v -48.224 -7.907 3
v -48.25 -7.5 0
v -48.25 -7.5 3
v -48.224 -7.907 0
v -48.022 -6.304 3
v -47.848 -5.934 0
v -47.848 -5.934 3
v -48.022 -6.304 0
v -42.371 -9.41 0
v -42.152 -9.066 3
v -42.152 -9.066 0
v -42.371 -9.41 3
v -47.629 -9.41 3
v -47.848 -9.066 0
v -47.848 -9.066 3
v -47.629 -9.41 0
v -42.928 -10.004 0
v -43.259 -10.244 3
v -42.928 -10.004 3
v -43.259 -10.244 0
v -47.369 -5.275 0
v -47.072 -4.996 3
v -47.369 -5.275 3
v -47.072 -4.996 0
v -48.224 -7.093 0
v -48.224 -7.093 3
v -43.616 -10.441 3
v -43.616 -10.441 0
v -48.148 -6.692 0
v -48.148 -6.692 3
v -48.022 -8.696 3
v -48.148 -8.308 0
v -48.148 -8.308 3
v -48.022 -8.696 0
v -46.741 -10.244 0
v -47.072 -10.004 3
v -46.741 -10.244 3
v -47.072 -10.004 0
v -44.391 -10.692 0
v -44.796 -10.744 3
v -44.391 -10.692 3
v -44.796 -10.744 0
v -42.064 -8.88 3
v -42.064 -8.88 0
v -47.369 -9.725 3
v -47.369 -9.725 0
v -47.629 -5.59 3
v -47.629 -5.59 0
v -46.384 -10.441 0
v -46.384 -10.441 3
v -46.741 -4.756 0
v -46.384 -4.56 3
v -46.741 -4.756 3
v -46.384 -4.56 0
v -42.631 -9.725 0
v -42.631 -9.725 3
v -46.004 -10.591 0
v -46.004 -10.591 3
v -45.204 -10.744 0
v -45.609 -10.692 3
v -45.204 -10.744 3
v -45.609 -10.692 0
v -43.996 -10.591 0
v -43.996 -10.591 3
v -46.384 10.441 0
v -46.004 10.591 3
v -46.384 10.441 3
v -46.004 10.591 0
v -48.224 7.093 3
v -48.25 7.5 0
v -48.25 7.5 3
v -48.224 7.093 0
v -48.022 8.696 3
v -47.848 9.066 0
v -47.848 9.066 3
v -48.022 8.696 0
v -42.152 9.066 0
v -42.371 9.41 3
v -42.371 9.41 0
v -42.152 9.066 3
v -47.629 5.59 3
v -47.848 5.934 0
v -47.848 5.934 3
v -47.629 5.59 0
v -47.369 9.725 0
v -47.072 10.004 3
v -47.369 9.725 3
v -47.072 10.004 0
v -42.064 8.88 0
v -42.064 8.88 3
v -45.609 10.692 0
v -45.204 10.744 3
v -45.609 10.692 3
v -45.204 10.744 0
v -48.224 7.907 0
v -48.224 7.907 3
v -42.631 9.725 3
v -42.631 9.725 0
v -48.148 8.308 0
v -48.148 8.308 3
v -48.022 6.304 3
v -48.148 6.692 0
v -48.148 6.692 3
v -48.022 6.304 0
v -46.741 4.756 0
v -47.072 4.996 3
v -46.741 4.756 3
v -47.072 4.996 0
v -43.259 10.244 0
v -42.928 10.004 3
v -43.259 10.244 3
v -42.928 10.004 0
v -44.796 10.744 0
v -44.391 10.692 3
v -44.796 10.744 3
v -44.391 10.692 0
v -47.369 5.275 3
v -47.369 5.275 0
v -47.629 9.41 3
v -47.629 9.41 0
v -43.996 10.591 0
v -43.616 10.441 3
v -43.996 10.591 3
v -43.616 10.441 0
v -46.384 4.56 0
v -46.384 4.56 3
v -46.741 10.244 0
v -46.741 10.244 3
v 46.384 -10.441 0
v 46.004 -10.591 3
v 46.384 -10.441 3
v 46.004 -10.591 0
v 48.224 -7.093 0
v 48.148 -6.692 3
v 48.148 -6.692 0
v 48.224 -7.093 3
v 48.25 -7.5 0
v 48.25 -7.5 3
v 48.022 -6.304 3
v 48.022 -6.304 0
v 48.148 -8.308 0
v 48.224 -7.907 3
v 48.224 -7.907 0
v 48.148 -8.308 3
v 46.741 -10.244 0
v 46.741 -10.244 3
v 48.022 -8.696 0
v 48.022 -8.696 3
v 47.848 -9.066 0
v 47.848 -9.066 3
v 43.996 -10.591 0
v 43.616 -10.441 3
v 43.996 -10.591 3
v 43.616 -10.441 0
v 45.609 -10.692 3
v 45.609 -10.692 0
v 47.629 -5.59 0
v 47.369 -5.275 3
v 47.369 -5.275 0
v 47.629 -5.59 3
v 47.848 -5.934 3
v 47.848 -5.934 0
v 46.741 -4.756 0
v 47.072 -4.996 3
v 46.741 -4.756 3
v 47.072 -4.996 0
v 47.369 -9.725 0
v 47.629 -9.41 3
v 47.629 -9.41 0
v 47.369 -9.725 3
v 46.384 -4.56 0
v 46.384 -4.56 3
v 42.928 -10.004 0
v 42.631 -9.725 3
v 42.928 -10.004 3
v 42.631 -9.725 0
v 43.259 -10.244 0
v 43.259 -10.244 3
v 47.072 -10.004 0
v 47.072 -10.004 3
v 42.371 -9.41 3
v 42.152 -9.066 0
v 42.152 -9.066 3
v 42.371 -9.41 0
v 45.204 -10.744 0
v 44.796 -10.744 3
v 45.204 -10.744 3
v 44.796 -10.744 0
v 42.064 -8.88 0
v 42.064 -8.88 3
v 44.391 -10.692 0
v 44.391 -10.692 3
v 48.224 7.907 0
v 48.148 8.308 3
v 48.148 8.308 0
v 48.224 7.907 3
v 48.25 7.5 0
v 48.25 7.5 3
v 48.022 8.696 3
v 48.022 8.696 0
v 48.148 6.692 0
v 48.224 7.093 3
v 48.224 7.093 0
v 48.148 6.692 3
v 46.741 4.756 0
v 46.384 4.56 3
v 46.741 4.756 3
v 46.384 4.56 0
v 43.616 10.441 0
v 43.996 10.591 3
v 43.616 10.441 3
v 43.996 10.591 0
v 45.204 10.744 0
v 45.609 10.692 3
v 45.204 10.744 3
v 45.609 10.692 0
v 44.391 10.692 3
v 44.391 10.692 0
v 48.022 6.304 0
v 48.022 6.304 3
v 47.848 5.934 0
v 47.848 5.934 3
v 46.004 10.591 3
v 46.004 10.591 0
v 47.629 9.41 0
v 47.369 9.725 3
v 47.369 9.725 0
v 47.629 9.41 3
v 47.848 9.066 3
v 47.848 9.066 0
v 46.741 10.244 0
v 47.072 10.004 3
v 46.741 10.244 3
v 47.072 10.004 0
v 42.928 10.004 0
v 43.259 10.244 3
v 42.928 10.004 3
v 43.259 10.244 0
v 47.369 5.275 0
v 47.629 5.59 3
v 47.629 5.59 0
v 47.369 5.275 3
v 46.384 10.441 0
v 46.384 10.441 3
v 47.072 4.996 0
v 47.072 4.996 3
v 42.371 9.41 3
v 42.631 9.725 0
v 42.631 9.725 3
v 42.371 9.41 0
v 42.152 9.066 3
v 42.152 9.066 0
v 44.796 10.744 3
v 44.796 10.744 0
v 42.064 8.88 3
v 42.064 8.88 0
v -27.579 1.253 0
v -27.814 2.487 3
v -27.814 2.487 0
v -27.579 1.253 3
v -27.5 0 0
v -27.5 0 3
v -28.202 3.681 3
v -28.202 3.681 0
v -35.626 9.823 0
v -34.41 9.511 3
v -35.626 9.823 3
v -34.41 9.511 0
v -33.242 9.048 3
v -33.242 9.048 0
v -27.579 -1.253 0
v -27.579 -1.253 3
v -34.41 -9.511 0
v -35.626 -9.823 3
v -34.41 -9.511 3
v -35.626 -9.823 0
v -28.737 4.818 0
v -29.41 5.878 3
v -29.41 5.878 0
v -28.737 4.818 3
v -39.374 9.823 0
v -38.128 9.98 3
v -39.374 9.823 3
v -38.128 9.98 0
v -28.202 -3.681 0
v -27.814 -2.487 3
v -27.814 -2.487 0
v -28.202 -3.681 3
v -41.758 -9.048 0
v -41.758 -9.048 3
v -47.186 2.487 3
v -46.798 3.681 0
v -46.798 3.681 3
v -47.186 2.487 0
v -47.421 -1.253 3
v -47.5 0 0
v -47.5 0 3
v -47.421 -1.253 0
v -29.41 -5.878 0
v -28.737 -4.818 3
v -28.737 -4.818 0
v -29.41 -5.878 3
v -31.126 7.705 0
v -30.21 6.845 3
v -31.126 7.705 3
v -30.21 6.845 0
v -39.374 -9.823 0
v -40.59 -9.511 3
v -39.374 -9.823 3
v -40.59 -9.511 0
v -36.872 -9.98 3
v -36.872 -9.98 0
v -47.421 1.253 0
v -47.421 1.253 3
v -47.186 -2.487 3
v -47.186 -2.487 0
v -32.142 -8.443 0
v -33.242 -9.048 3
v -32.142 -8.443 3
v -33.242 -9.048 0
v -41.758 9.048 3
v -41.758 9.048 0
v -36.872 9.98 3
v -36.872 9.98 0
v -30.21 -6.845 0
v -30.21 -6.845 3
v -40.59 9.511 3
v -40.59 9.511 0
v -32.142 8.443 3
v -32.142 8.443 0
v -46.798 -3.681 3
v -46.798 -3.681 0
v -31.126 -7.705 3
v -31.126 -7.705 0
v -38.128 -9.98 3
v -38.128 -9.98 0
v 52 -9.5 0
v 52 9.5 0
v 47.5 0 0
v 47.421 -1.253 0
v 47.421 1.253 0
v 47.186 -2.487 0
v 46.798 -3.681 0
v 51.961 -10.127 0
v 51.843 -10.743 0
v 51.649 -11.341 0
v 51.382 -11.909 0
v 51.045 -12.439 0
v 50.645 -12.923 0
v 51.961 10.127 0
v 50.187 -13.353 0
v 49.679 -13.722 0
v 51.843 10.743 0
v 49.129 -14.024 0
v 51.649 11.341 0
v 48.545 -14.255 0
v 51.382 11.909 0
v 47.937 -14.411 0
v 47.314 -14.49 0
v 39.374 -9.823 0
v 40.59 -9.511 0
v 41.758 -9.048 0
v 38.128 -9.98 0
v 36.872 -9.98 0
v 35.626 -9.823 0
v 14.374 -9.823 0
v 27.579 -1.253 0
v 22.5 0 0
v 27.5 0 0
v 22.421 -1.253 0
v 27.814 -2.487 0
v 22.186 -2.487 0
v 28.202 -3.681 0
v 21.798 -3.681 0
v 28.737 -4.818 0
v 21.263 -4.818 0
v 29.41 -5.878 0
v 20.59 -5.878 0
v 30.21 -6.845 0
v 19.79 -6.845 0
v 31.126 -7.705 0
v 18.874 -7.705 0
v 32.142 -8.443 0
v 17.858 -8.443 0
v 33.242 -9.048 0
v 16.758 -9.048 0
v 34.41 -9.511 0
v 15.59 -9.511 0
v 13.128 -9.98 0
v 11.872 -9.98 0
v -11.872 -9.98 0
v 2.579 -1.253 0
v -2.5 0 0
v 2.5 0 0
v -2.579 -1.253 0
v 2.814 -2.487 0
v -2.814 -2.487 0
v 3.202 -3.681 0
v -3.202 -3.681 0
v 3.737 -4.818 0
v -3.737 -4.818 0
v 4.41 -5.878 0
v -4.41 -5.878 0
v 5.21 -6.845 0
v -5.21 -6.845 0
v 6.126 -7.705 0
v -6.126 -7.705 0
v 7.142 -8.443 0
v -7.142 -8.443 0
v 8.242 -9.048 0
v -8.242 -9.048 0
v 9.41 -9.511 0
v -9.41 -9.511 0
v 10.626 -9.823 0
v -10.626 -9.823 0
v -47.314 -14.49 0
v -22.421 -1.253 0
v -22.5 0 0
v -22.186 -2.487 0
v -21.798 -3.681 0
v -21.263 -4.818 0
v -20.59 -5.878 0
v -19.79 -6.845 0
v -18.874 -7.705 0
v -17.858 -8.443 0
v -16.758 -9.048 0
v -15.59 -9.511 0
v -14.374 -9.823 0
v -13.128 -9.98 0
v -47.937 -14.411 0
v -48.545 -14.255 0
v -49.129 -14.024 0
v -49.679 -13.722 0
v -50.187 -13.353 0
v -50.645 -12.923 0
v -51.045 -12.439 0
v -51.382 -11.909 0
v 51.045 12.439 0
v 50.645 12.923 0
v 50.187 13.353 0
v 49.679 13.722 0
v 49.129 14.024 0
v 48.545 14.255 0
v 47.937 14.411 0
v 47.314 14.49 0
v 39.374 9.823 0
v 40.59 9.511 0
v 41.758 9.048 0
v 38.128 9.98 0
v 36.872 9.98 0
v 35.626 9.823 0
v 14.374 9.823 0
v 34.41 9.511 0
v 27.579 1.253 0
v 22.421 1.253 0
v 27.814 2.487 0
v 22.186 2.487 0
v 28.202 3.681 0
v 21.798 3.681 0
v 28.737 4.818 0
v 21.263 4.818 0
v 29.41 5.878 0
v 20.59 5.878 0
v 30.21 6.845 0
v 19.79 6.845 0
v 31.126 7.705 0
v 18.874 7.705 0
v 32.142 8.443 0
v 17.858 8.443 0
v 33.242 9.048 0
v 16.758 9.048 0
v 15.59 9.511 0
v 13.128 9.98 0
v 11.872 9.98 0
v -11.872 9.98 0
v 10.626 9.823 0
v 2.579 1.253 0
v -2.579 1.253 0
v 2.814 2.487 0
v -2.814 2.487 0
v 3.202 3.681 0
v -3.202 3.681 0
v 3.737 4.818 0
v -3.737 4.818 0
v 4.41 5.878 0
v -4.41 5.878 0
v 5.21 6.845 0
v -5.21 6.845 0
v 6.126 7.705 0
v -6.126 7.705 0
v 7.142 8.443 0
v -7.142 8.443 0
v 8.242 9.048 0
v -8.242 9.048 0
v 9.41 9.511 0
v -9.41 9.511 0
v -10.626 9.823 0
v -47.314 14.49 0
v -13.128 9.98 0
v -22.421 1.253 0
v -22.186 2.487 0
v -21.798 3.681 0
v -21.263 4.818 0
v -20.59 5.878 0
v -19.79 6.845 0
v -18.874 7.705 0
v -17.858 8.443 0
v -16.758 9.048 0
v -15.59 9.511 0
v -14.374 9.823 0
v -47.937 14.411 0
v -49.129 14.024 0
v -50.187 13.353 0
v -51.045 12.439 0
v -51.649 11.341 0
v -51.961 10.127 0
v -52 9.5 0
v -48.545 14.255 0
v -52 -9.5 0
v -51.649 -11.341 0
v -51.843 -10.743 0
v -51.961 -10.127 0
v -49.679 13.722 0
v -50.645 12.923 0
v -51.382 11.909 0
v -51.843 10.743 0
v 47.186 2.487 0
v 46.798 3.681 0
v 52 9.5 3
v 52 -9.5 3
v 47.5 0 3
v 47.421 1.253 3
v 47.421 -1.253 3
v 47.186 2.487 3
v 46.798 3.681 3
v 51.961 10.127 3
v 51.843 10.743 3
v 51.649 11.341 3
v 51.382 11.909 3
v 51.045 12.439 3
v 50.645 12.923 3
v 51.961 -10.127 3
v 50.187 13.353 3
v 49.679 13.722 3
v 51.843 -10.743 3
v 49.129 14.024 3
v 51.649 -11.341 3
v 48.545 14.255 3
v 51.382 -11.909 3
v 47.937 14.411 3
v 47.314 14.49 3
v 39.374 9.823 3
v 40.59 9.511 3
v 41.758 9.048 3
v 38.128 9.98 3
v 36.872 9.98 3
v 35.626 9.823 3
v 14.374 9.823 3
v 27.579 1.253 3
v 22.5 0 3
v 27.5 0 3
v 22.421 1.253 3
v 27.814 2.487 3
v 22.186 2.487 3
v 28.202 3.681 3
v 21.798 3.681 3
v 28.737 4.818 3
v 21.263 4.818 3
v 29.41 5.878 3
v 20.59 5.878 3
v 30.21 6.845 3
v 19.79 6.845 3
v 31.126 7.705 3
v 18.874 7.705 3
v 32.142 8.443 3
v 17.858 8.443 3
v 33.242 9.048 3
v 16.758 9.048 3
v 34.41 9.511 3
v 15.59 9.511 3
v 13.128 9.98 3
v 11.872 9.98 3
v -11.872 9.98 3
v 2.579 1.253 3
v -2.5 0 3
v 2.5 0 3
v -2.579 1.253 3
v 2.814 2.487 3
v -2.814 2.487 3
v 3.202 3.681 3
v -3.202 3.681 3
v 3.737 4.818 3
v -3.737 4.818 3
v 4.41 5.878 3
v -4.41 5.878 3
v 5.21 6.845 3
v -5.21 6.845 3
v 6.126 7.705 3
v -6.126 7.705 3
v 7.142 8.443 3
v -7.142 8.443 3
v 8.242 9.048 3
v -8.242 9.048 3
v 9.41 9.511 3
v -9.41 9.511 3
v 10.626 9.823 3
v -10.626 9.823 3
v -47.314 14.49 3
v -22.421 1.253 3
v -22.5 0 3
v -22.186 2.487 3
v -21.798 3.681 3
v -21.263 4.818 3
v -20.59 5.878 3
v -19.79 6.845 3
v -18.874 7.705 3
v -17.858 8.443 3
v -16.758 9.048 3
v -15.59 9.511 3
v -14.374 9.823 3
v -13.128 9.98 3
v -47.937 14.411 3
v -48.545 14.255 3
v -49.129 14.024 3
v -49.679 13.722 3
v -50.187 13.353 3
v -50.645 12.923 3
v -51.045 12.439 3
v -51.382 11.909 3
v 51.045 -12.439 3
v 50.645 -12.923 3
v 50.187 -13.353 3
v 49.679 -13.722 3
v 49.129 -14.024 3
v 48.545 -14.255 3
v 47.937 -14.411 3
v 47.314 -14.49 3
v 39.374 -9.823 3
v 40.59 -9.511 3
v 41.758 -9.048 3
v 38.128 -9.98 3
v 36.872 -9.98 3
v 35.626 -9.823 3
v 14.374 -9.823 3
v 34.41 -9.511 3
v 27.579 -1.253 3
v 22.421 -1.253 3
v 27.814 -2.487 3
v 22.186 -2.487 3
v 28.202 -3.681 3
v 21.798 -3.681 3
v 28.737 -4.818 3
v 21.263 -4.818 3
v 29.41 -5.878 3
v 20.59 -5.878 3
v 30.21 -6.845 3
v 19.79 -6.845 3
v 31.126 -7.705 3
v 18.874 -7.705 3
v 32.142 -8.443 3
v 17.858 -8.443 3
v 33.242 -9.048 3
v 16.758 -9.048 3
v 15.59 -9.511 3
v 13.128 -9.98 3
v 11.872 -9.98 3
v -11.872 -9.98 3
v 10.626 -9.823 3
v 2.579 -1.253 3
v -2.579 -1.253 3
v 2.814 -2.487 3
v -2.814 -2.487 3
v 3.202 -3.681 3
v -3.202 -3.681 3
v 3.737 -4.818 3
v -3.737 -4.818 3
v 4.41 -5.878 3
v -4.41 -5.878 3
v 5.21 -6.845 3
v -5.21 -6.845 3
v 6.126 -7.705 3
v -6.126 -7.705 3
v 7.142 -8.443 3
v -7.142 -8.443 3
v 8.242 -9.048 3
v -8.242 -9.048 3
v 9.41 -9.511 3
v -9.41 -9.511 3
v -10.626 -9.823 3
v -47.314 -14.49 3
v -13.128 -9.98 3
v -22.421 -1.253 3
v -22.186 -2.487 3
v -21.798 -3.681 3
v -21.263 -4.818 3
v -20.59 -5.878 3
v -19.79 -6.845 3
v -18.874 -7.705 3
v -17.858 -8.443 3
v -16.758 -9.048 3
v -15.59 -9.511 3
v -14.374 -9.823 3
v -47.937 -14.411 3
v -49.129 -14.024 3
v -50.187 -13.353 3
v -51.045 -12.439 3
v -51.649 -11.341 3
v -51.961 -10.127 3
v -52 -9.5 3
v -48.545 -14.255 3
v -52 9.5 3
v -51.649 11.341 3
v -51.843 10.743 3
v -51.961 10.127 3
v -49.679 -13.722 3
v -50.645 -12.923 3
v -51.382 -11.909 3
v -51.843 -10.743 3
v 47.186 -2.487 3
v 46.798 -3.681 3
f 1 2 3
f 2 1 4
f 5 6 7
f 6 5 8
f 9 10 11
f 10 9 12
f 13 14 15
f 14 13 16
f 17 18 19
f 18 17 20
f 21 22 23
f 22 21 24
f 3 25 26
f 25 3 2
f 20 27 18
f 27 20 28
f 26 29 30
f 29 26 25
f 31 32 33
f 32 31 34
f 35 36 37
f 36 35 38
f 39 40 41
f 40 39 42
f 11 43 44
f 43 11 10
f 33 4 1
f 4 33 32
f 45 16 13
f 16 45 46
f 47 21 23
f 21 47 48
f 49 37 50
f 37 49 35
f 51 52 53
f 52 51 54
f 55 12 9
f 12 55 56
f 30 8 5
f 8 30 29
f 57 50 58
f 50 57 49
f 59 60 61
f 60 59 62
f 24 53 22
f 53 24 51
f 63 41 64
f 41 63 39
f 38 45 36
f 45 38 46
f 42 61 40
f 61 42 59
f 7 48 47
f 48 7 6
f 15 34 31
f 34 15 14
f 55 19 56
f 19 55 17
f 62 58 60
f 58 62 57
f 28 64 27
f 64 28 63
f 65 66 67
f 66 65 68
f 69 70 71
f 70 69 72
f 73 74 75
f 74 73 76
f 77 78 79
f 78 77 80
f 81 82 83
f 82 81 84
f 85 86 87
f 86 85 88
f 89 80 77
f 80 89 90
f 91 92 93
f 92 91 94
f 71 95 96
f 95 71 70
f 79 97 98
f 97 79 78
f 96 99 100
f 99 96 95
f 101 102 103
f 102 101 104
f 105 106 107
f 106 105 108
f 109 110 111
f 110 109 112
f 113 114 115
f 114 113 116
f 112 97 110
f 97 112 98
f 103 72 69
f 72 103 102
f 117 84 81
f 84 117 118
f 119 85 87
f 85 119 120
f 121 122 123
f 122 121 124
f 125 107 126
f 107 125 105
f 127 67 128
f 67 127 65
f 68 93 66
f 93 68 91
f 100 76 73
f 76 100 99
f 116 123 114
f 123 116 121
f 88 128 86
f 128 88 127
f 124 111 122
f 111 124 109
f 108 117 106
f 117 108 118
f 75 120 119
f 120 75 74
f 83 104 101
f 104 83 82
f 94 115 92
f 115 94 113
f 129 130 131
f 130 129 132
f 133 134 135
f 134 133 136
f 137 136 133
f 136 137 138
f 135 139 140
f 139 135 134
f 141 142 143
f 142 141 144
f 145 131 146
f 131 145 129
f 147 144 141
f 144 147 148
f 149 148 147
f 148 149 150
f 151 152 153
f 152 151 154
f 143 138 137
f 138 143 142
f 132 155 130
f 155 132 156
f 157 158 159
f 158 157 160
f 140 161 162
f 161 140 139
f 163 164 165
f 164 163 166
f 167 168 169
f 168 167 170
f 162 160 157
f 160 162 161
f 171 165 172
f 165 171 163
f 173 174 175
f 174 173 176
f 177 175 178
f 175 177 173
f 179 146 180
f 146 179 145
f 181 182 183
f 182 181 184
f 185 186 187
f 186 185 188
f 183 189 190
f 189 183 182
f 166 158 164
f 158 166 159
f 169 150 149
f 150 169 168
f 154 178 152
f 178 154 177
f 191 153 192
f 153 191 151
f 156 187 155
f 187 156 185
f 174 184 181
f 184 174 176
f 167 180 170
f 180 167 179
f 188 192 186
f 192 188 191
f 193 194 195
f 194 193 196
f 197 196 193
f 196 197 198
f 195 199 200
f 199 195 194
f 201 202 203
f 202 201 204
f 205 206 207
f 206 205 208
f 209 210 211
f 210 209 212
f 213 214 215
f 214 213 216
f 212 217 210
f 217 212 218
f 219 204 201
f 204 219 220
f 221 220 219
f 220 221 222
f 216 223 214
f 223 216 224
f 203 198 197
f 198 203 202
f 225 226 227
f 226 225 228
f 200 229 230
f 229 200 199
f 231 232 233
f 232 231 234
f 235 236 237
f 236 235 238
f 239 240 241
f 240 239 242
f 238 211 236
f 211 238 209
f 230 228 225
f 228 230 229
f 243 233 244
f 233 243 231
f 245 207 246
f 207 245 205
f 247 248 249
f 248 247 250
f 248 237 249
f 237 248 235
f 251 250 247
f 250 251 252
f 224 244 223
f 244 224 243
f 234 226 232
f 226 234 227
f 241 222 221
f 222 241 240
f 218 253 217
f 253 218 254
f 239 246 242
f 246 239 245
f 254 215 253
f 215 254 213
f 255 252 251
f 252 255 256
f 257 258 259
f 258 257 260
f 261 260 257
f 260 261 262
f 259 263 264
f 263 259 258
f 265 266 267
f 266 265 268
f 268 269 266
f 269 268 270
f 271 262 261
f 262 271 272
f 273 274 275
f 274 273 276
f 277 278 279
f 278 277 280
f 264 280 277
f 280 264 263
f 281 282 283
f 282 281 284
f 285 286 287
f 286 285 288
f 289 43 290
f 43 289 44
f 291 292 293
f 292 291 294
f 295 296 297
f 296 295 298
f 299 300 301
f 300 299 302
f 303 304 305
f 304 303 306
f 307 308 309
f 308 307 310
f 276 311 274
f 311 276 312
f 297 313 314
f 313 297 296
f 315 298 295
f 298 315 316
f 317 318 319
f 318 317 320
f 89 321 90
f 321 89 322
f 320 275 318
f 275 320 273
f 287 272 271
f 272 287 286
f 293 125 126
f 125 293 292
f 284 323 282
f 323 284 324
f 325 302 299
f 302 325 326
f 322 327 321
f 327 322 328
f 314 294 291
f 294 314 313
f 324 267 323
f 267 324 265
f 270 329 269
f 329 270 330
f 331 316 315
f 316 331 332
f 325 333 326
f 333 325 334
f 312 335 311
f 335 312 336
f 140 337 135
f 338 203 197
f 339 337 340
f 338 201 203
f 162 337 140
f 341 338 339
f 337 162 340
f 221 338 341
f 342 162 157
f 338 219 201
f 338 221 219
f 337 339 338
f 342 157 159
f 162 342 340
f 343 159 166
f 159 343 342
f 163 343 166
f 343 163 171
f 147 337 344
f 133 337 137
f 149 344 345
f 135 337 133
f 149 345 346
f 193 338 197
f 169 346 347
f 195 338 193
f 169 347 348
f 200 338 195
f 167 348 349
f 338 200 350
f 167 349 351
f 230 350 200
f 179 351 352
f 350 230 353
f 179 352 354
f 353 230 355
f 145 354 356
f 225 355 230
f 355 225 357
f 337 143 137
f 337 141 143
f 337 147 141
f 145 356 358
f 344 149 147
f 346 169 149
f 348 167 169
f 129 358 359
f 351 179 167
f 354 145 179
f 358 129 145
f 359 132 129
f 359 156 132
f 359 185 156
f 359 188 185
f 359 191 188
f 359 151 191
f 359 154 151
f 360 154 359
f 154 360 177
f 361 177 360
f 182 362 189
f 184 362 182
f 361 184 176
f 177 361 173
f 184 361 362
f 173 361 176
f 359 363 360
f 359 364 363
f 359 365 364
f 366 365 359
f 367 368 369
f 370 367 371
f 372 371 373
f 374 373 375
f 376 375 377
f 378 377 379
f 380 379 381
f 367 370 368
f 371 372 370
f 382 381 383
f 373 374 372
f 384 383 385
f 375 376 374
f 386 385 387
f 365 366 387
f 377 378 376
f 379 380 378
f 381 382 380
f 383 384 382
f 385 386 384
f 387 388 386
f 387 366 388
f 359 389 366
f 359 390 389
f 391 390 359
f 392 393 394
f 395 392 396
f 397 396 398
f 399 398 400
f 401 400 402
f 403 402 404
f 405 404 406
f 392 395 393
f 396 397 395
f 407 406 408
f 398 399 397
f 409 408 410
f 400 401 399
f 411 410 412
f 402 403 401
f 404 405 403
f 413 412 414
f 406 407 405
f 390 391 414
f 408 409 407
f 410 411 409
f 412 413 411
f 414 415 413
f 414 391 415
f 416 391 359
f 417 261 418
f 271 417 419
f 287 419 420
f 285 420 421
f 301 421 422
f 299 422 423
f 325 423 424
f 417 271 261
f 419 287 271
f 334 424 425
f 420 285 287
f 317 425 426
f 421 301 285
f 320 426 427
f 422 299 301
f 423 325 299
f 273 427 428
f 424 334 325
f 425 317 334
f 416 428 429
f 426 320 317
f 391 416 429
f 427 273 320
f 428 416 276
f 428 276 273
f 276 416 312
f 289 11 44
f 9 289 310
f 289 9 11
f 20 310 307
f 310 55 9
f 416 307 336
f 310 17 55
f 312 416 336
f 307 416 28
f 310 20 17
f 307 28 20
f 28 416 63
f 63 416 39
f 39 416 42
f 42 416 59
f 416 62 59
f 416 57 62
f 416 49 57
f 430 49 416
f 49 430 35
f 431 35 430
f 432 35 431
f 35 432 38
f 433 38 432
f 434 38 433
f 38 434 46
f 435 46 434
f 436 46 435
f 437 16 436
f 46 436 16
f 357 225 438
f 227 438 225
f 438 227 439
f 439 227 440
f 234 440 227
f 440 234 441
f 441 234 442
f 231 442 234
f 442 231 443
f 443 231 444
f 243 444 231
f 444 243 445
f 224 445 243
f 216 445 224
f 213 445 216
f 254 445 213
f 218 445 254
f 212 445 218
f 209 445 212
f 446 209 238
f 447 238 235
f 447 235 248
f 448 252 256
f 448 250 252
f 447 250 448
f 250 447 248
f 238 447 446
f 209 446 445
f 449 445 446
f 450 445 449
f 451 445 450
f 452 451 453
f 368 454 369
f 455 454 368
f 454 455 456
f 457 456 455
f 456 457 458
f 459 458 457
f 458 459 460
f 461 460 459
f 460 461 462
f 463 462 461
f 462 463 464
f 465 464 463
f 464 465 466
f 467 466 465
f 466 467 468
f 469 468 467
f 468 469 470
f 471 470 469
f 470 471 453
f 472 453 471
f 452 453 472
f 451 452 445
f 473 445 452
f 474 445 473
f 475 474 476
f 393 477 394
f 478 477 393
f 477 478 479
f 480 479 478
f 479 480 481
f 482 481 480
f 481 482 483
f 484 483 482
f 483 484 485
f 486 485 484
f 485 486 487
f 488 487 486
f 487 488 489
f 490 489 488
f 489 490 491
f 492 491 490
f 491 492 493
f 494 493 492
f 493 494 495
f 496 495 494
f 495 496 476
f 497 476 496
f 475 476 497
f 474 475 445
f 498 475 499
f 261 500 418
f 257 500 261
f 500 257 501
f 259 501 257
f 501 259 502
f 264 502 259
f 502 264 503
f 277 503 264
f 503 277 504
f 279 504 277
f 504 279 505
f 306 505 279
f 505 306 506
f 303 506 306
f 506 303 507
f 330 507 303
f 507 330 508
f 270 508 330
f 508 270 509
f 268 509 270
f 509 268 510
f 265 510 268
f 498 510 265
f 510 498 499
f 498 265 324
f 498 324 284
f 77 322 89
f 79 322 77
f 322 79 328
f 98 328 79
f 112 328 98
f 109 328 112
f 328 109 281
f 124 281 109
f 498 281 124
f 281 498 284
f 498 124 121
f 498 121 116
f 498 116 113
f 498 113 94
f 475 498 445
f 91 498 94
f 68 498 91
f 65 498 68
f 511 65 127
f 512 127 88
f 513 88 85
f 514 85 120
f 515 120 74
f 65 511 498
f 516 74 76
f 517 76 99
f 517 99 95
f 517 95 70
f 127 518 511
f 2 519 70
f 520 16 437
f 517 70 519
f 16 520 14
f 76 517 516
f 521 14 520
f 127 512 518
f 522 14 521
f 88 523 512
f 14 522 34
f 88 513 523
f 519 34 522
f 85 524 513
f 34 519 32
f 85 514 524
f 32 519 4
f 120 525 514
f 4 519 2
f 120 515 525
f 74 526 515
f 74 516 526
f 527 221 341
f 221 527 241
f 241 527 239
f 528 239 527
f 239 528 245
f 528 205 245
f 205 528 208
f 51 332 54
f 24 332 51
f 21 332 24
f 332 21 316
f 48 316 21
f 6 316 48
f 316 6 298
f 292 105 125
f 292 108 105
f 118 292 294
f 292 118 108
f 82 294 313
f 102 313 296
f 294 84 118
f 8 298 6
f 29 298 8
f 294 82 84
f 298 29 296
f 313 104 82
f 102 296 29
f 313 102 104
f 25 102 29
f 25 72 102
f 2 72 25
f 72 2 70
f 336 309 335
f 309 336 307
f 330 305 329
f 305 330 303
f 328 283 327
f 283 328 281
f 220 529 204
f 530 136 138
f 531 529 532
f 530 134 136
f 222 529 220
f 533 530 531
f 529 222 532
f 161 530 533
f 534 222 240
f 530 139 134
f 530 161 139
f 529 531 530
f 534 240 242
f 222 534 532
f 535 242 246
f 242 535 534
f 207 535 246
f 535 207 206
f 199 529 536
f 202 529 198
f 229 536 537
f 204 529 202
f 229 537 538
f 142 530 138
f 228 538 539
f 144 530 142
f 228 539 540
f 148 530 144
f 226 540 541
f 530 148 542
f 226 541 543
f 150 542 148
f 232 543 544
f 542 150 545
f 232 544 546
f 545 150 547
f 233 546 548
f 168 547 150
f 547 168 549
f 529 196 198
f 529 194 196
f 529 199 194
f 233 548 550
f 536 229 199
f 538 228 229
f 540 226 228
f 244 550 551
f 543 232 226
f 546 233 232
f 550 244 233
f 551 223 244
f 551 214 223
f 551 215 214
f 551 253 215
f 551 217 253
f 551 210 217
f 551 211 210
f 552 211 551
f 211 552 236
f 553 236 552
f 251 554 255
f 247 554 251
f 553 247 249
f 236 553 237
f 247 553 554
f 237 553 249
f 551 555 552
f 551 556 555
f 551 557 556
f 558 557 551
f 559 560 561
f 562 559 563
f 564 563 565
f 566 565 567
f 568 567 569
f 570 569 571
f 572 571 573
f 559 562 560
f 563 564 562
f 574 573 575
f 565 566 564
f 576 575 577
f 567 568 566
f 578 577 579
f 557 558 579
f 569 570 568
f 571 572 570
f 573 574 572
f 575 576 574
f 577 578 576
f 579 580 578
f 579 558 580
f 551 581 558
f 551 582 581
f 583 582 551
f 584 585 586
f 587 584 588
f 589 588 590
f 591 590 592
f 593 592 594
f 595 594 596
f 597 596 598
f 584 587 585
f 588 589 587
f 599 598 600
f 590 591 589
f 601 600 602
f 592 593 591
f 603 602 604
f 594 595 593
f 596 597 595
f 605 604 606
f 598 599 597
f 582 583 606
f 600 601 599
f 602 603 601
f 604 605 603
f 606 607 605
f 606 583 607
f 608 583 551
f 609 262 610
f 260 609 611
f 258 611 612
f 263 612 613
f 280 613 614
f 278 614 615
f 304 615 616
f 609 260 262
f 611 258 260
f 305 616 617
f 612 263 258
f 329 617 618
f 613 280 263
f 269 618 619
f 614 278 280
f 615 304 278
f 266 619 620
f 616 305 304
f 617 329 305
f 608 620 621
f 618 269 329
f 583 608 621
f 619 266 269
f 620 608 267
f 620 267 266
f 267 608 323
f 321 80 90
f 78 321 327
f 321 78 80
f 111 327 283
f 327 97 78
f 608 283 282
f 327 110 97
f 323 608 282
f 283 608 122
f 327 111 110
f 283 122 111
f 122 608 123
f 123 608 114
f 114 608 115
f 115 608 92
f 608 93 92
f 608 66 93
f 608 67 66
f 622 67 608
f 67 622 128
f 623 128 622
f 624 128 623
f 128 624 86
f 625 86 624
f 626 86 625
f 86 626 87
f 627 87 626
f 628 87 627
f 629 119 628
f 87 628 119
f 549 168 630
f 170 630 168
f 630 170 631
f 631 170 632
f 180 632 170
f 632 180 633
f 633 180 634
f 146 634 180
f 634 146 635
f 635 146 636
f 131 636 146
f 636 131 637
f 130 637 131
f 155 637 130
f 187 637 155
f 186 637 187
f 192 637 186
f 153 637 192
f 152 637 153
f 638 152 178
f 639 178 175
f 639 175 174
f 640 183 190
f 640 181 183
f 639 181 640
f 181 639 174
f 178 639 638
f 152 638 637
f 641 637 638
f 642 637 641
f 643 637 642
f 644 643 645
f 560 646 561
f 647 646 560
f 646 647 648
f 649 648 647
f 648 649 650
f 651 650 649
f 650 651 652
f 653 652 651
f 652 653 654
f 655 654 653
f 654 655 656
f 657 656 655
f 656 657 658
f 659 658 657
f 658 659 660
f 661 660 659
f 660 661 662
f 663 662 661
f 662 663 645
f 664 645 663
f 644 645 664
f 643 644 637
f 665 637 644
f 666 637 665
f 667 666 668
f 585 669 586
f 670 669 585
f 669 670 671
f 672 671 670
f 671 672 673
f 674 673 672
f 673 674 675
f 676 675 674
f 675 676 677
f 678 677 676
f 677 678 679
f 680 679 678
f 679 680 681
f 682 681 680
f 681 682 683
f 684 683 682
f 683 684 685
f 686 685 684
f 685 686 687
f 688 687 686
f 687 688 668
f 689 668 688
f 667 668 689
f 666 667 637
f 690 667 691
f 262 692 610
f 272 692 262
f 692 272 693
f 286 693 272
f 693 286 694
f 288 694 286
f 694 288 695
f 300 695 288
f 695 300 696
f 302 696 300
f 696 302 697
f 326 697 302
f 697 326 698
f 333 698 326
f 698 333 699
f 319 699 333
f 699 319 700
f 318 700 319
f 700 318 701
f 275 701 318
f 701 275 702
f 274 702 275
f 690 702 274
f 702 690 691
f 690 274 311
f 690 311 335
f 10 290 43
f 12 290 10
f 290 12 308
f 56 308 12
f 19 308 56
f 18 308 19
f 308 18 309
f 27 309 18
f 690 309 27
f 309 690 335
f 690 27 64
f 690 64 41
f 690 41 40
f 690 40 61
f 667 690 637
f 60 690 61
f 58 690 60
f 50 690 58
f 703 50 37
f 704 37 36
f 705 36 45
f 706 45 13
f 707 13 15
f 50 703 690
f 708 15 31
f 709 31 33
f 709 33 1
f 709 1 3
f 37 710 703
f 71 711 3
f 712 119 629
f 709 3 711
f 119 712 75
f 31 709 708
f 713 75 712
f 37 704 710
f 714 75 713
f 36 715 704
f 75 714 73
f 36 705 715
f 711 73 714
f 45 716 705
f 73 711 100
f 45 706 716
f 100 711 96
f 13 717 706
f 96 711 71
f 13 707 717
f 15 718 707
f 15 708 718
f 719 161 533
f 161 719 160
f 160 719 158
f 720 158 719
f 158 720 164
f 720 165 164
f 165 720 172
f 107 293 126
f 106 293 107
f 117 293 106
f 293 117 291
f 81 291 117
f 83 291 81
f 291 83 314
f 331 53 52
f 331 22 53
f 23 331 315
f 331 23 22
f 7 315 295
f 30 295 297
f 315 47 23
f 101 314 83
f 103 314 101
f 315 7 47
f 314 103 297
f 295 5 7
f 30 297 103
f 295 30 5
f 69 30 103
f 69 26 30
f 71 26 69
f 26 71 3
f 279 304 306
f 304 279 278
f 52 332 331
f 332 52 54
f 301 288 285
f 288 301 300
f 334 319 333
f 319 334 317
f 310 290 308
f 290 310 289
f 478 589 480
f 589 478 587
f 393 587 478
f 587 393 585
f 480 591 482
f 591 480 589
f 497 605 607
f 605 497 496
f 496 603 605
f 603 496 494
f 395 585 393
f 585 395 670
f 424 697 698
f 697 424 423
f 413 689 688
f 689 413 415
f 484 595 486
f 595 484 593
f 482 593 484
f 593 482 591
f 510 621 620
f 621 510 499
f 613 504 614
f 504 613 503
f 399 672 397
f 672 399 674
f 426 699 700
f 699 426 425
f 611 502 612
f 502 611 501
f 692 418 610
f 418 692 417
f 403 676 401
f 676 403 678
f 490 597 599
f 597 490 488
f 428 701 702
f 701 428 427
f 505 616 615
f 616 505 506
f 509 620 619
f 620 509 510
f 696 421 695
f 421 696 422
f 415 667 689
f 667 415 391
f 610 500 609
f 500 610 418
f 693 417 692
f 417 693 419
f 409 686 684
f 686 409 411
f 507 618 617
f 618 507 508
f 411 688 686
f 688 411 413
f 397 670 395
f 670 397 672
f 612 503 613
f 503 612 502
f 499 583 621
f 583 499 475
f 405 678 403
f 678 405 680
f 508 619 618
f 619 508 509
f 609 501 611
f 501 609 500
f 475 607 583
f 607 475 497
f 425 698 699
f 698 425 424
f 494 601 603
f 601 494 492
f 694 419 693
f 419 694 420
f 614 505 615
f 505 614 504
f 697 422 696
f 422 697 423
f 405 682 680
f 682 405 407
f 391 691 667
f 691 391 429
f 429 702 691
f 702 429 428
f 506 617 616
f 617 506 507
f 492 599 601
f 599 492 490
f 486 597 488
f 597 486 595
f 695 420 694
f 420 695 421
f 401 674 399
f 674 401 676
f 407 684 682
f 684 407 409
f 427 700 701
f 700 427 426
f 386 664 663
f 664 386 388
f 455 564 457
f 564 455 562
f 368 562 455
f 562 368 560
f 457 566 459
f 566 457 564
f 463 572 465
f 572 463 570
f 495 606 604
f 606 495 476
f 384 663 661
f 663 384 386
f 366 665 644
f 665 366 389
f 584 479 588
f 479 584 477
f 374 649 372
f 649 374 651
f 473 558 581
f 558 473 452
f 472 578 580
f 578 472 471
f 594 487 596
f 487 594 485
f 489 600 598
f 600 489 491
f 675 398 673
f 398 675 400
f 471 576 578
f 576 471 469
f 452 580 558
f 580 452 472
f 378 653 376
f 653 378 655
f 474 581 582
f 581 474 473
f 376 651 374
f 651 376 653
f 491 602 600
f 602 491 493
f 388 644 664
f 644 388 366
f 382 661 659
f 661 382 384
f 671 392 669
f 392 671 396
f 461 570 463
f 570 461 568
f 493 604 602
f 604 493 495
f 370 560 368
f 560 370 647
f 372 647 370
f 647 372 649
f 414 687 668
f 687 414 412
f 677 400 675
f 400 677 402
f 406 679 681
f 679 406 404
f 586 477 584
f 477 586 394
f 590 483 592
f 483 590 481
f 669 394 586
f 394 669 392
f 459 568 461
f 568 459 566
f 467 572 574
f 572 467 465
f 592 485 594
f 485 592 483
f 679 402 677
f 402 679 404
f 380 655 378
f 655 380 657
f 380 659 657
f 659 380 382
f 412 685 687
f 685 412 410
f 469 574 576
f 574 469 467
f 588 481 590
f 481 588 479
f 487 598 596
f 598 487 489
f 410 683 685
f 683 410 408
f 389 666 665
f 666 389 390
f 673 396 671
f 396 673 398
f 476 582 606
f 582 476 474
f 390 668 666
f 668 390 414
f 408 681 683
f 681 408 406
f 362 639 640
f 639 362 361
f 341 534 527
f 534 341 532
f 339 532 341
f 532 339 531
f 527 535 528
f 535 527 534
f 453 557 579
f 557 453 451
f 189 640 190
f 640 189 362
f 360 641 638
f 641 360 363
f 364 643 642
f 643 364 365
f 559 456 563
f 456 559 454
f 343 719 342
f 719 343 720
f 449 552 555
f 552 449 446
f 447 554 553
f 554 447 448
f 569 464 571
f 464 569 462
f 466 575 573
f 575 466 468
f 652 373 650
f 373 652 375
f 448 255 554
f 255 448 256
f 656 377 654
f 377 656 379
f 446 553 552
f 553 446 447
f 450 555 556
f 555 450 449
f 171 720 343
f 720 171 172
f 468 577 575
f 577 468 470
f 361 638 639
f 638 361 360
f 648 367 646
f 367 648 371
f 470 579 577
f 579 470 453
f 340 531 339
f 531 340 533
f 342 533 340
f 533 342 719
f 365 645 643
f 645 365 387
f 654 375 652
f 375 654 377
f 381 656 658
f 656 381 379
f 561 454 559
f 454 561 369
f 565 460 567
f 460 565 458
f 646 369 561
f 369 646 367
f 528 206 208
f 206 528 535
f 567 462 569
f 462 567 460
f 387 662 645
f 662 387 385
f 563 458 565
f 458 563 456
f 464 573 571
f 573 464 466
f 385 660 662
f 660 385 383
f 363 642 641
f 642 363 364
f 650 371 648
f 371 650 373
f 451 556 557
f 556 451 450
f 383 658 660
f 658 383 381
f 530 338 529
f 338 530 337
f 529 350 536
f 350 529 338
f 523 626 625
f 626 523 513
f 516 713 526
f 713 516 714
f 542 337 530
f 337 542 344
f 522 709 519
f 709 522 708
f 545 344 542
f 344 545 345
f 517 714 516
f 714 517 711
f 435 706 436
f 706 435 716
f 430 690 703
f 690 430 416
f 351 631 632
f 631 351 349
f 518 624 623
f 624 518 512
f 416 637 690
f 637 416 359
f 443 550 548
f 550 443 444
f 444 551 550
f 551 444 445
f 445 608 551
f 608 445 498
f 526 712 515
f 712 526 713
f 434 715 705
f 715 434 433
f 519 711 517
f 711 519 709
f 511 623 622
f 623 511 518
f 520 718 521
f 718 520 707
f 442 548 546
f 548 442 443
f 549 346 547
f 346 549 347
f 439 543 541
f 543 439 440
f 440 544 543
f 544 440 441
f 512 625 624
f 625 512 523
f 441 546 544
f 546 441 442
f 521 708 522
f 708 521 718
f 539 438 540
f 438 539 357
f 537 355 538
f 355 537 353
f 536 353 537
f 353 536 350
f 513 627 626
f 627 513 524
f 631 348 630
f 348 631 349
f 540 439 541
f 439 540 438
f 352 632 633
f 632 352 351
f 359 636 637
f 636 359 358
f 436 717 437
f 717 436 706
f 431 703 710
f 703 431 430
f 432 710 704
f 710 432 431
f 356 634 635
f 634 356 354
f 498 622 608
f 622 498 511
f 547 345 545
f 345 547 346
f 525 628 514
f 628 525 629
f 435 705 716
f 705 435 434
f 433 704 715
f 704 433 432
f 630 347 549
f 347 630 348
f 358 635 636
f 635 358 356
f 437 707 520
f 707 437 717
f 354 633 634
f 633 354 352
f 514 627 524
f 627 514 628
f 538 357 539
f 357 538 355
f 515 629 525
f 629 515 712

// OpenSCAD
$fn = 50;


difference() {
	union() {
		hull() {
			translate(v = [-47.0000000000, 9.5000000000, 0]) {
				cylinder(h = 3, r = 5);
			}
			translate(v = [47.0000000000, 9.5000000000, 0]) {
				cylinder(h = 3, r = 5);
			}
			translate(v = [-47.0000000000, -9.5000000000, 0]) {
				cylinder(h = 3, r = 5);
			}
			translate(v = [47.0000000000, -9.5000000000, 0]) {
				cylinder(h = 3, r = 5);
			}
		}
	}
	union() {
		#translate(v = [-45.0000000000, -7.5000000000, -100.0000000000]) {
			cylinder(h = 200, r = 3.2500000000);
		}
		#translate(v = [-45.0000000000, 7.5000000000, -100.0000000000]) {
			cylinder(h = 200, r = 3.2500000000);
		}
		#translate(v = [45.0000000000, -7.5000000000, -100.0000000000]) {
			cylinder(h = 200, r = 3.2500000000);
		}
		#translate(v = [45.0000000000, 7.5000000000, -100.0000000000]) {
			cylinder(h = 200, r = 3.2500000000);
		}
		#translate(v = [-37.5000000000, 0, 0]) {
			cylinder(h = 3, r = 10.0000000000);
		}
		#translate(v = [-12.5000000000, 0, 0]) {
			cylinder(h = 3, r = 10.0000000000);
		}
		#translate(v = [12.5000000000, 0, 0]) {
			cylinder(h = 3, r = 10.0000000000);
		}
		#translate(v = [37.5000000000, 0, 0]) {
			cylinder(h = 3, r = 10.0000000000);
		}
	}
}
